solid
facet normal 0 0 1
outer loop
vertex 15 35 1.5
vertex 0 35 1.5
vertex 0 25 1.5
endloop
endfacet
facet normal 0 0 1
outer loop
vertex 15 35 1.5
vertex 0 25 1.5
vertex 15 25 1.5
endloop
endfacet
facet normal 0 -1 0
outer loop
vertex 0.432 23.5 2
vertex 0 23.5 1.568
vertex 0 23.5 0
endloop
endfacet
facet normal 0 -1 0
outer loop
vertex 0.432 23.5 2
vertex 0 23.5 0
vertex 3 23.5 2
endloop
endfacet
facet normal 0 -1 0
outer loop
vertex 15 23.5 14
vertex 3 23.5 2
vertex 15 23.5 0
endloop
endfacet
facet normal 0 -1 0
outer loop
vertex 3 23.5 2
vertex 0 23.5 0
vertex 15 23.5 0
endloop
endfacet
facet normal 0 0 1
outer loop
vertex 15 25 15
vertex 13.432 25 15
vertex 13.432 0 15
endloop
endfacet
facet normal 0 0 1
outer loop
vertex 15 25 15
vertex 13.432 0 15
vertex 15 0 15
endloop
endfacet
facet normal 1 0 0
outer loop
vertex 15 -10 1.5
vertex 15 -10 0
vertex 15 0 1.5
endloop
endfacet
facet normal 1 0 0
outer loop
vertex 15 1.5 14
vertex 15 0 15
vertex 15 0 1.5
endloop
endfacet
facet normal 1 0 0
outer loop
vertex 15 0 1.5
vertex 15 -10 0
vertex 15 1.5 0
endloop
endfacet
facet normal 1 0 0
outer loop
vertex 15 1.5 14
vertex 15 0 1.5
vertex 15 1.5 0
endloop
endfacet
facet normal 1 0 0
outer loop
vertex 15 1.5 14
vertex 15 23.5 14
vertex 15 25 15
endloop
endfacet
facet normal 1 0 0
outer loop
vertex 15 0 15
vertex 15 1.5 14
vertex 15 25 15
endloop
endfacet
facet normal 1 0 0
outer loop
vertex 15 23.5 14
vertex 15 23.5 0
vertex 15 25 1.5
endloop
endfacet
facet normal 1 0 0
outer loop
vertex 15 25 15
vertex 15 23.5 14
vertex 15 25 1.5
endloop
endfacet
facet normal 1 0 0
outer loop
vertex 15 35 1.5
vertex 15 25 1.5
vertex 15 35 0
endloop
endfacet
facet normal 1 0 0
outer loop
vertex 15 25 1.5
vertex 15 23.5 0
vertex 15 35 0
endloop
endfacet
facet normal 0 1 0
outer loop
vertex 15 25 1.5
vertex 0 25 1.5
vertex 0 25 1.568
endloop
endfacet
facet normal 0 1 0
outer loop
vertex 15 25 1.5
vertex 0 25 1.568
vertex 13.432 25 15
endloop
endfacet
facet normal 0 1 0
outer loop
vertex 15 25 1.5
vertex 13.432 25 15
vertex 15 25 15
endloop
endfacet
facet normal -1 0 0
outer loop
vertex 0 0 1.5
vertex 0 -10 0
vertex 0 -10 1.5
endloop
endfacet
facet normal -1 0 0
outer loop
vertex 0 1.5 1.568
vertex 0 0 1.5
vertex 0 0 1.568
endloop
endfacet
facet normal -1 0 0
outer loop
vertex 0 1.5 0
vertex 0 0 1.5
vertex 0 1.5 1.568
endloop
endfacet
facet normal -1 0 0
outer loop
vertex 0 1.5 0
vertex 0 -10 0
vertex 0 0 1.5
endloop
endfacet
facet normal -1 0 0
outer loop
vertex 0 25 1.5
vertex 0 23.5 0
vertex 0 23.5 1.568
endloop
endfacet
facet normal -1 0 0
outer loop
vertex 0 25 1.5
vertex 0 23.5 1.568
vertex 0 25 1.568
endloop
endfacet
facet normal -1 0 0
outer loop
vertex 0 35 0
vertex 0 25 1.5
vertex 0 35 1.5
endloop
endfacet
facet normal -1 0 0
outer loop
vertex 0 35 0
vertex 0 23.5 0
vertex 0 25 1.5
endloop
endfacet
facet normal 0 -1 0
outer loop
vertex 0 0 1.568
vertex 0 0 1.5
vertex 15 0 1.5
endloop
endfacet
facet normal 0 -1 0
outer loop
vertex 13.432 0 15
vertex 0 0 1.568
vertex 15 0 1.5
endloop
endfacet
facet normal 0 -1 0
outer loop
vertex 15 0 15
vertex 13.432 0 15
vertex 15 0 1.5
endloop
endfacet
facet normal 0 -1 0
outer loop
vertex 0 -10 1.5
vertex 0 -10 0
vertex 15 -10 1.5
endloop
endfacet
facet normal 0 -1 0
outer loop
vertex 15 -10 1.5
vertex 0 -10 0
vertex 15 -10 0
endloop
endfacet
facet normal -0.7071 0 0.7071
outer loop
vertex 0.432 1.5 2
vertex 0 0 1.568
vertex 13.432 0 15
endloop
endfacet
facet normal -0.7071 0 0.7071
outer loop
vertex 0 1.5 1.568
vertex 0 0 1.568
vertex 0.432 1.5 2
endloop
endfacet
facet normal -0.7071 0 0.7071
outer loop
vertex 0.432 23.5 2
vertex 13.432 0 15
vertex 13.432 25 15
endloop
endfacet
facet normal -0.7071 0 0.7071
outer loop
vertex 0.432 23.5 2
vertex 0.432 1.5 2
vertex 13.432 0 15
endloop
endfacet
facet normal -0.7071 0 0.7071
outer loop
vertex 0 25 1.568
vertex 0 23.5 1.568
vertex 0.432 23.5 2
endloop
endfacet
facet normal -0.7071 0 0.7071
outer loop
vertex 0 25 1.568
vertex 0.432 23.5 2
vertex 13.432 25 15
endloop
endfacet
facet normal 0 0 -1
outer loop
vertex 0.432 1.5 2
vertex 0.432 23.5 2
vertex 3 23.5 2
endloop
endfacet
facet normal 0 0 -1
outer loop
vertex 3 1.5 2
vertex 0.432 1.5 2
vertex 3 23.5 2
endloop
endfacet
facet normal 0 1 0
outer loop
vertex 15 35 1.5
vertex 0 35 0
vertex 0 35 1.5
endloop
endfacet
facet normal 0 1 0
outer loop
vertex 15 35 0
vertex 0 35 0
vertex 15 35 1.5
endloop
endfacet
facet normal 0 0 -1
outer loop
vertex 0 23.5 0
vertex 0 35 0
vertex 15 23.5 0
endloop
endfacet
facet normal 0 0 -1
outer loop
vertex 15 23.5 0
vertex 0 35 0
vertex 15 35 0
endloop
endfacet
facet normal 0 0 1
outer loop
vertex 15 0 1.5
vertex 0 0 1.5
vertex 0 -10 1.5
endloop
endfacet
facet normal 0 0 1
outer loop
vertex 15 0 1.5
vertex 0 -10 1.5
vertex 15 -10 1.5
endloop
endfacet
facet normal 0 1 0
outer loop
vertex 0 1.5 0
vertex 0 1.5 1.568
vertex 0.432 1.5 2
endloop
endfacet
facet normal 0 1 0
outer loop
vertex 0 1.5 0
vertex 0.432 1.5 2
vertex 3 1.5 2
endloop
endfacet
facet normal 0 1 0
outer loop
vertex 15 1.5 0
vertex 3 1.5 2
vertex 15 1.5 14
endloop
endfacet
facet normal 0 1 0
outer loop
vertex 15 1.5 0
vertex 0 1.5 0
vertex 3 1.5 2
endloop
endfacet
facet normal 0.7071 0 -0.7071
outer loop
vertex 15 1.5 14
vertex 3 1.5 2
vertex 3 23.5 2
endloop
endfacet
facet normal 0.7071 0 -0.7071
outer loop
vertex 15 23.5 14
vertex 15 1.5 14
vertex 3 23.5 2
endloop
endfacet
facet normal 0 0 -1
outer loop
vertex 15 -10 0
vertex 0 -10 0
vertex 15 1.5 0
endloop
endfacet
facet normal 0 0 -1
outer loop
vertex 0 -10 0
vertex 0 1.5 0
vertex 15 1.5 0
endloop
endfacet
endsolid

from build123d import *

# Parameters (mm, degrees)
BOX001002002_W           = 10
BOX001002002_H           = 22
BOX001002002_DEPTH       = 5
BOX001002_W              = 10
BOX001002_H              = 22
BOX001002_DEPTH          = 20
BOX001002_PITCH_ANGLE    = 44.999934
BOX001002001_W           = 10
BOX001002001_H           = 27
BOX001002001_DEPTH       = 22
BOX001002001_PITCH_ANGLE = 44.999934
BOX_W                    = 15
BOX_H                    = 25
BOX_DEPTH                = 15
BOX001001_W              = 15
BOX001001_H              = 10
BOX001001_DEPTH          = 1.5
BOX001_W                 = 15
BOX001_H                 = 10
BOX001_DEPTH             = 1.5


with BuildPart() as box005:
    # Box001002002 → Box001002002 (new body)
    with BuildSketch(Plane(origin=(-3, 1.5, -3), x_dir=(1, 0, 0), z_dir=(0, 0, 1))):
        with Locations((5, 11)):
            Rectangle(BOX001002002_W, BOX001002002_H)
    extrude(amount=BOX001002002_DEPTH)


with BuildPart() as box003:
    # Box001002 → Box001002 (new body)
    with BuildSketch(Plane.XY):
        with Locations((5, 11)):
            Rectangle(BOX001002_W, BOX001002_H)
    extrude(amount=BOX001002_DEPTH)


with BuildPart() as box003_1:
    # Box001002 pitch: moved
    add(box003.part.rotate(Axis((0, 0, 0), (0, 1, 0)), BOX001002_PITCH_ANGLE))


with BuildPart() as box003_2:
    # Box001002 placement: moved
    add(box003_1.part.moved(Location((1, 1.5, 0))))


with BuildPart() as fusion:
    # Box001002001 → Box001002001 (new body)
    with BuildSketch(Plane.XY):
        with Locations((5, 13.5)):
            Rectangle(BOX001002001_W, BOX001002001_H)
    extrude(amount=BOX001002001_DEPTH)


with BuildPart() as fusion_1:
    # Box001002001 pitch: moved
    add(fusion.part.rotate(Axis((0, 0, 0), (0, 1, 0)), BOX001002001_PITCH_ANGLE))


with BuildPart() as fusion_2:
    # Box001002001 placement: moved
    add(fusion_1.part.moved(Location((-8.71, -1, 7))))

    # Fusion: union Box005, Box003
    add(box005.part)
    add(box003_2.part)


with BuildPart() as cut:
    # Box → Box (new body)
    with BuildSketch(Plane.XY):
        with Locations((7.5, 12.5)):
            Rectangle(BOX_W, BOX_H)
    extrude(amount=BOX_DEPTH)

    # Cut: cut Fusion
    add(fusion_2.part, mode=Mode.SUBTRACT)


with BuildPart() as box002:
    # Box001001 → Box001001 (new body)
    with BuildSketch(Plane(origin=(0, -10, 0), x_dir=(1, 0, 0), z_dir=(0, 0, 1))):
        with Locations((7.5, 5)):
            Rectangle(BOX001001_W, BOX001001_H)
    extrude(amount=BOX001001_DEPTH)


with BuildPart() as mirrormount:
    # Box001 → Box001 (new body)
    with BuildSketch(Plane(origin=(0, 25, 0), x_dir=(1, 0, 0), z_dir=(0, 0, 1))):
        with Locations((7.5, 5)):
            Rectangle(BOX001_W, BOX001_H)
    extrude(amount=BOX001_DEPTH)

    # Fusion001: union Cut, Box002
    add(cut.part)
    add(box002.part)


solid = mirrormount.part
